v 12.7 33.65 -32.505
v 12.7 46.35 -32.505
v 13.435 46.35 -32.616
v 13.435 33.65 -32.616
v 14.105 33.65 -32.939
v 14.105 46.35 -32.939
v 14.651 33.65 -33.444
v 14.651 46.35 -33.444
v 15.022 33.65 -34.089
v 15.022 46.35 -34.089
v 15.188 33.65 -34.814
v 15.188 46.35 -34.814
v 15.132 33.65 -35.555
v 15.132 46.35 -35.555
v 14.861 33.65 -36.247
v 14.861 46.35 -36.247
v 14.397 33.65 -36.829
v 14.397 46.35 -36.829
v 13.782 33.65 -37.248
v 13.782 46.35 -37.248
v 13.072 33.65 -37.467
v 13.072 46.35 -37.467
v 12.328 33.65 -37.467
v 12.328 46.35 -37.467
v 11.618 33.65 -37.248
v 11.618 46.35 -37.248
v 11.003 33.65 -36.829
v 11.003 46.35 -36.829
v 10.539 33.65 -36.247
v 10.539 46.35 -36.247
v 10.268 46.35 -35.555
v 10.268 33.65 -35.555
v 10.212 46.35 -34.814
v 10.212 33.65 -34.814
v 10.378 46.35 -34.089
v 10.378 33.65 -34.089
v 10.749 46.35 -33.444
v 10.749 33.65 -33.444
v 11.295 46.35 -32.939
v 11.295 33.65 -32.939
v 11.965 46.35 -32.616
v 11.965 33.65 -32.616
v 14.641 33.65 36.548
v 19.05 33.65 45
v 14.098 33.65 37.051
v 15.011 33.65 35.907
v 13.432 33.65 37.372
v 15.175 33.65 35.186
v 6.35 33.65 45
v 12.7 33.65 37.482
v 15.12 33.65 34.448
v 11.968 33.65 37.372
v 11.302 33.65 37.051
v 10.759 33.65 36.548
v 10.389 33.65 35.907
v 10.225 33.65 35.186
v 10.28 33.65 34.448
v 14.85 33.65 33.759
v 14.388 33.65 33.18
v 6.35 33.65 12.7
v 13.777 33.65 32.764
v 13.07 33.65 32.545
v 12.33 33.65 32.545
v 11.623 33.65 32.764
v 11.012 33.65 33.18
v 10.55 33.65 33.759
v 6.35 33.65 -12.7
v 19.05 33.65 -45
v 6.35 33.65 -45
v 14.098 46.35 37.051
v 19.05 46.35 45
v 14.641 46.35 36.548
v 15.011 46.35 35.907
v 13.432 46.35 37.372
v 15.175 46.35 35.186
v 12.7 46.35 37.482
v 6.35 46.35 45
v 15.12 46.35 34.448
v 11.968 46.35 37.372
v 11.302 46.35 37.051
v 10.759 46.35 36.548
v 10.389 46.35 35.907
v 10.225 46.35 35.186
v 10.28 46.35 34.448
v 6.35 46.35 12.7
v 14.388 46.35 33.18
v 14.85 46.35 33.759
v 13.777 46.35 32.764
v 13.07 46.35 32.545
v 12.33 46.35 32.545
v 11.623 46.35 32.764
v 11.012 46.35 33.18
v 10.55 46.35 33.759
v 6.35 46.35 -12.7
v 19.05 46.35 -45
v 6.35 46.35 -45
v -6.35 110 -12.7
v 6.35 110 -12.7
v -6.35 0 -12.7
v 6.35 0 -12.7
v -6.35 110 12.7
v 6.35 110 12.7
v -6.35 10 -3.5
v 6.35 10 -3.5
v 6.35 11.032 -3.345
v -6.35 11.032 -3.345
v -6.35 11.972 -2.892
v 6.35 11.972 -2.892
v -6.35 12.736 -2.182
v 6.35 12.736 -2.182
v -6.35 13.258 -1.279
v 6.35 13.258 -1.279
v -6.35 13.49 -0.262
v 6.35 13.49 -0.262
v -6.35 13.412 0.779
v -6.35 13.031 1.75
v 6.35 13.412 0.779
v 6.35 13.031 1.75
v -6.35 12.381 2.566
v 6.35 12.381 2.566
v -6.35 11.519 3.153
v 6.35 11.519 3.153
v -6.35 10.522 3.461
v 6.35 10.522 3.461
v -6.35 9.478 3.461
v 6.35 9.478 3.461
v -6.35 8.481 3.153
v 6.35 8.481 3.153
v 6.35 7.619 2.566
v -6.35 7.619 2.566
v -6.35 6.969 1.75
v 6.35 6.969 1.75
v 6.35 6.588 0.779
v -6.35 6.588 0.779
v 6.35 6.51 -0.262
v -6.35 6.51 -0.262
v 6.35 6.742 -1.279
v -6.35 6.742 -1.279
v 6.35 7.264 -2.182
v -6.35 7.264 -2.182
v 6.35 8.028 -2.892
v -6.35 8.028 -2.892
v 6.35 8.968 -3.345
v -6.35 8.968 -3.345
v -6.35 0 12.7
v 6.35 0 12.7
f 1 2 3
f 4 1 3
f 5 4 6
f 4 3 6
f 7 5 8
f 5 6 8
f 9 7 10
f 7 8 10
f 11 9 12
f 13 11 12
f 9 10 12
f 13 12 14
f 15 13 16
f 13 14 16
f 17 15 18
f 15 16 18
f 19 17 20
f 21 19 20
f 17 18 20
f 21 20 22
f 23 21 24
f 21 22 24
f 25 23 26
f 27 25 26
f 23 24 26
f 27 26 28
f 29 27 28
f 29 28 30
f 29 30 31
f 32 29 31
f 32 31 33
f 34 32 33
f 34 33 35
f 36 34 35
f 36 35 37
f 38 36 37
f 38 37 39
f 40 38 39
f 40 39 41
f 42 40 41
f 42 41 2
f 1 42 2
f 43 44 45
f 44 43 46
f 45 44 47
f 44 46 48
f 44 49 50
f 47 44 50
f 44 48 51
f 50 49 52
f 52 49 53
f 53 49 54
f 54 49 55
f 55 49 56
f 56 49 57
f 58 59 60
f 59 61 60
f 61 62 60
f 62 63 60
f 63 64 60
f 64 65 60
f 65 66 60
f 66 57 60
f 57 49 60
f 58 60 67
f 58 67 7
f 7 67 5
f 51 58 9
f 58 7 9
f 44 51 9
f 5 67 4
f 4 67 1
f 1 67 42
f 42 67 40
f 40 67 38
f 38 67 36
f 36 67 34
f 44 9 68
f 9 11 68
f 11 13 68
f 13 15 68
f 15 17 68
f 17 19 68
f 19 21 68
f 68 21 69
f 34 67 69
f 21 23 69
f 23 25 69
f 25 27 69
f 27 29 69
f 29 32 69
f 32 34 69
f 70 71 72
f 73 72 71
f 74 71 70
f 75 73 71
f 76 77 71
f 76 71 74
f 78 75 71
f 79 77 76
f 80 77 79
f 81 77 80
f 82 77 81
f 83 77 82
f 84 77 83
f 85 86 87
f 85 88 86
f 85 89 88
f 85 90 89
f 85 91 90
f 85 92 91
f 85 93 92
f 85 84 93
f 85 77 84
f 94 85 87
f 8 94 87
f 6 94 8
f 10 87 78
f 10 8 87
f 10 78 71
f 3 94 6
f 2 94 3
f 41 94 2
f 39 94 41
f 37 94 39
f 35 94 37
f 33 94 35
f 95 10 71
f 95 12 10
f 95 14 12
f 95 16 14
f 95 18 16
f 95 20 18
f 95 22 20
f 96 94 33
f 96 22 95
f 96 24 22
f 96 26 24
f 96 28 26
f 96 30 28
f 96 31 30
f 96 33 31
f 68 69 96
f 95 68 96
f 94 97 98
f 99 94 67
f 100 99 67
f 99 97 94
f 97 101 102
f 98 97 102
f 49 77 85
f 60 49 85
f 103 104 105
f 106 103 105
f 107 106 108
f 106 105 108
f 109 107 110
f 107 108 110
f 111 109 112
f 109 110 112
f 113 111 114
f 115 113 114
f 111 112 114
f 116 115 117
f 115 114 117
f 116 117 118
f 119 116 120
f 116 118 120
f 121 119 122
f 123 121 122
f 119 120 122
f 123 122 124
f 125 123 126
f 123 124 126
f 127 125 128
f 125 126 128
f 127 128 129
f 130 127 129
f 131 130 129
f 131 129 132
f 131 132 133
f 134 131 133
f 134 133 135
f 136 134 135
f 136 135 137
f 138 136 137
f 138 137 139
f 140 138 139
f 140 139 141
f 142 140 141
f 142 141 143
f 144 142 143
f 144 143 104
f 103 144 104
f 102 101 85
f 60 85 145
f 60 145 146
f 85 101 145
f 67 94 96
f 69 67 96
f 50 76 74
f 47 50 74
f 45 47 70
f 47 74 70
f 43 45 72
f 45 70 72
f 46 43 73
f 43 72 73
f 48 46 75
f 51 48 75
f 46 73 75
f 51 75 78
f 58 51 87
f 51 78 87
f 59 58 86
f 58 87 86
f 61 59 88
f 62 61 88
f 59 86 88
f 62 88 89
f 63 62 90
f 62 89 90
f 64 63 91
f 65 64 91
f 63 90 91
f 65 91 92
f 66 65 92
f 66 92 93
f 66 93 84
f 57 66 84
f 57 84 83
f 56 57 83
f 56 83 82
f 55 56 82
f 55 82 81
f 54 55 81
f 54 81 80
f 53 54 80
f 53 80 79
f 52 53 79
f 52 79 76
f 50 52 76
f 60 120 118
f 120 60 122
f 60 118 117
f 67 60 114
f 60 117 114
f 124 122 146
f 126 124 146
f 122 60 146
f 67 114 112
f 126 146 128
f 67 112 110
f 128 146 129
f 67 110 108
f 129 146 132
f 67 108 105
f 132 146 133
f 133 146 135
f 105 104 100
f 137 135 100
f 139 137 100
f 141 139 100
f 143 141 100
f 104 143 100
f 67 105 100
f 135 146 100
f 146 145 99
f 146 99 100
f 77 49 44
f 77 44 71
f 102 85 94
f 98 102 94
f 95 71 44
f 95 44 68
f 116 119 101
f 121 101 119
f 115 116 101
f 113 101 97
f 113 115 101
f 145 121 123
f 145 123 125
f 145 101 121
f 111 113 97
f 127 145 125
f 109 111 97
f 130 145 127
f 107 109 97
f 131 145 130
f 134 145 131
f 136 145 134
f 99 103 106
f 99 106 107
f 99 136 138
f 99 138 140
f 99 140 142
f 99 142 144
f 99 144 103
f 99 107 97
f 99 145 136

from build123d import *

# Parameters (mm, degrees)
CROQUIS1_W              = 12.7
CROQUIS1_H              = 25.4
SALIENTE_EXTRUIR1_DEPTH = 110
CROQUIS2_W              = 90
CROQUIS2_H              = 12.7
SALIENTE_EXTRUIR2_DEPTH = 12.7
CROQUIS3_R              = 3.5
CORTAR_EXTRUIR1_DEPTH   = 120.525269295
CROQUIS4_R              = 2.494853736
CROQUIS4_R_2            = 2.482276025
CORTAR_EXTRUIR2_DEPTH   = 81.244781762


with BuildPart() as part:
    # Croquis1 → Saliente-Extruir1 (new body)
    with BuildSketch(Plane(origin=(0, 0, 0), x_dir=(1, 0, 0), z_dir=(0, 1, 0))):
        Rectangle(CROQUIS1_W, CROQUIS1_H)
    extrude(amount=SALIENTE_EXTRUIR1_DEPTH)

    # Croquis2 → Saliente-Extruir2 (add)
    with BuildSketch(Plane(origin=(6.35, 0, 0), x_dir=(0, 0, -1), z_dir=(1, 0, 0))):
        with Locations((0, 40)):
            Rectangle(CROQUIS2_W, CROQUIS2_H)
    extrude(amount=SALIENTE_EXTRUIR2_DEPTH)

    # Croquis3 → Cortar-Extruir1 (cut, through all)
    with BuildSketch(Plane(origin=(6.35, 0, 0), x_dir=(0, 0, -1), z_dir=(1, 0, 0))):
        with Locations((0, 10)):
            Circle(CROQUIS3_R)
    extrude(amount=-CORTAR_EXTRUIR1_DEPTH, mode=Mode.SUBTRACT)

    # Croquis4 → Cortar-Extruir2 (cut, through all)
    with BuildSketch(Plane(origin=(0, 46.35, 0), x_dir=(1, 0, 0), z_dir=(0, 1, 0))):
        with Locations(Location((12.7, 35, 0), (0, 0, 270))):
            Circle(CROQUIS4_R)
        with Locations(Location((12.7, -35, 0), (0, 0, 270))):
            Circle(CROQUIS4_R_2)
    extrude(amount=-CORTAR_EXTRUIR2_DEPTH, mode=Mode.SUBTRACT)


solid = part.part
